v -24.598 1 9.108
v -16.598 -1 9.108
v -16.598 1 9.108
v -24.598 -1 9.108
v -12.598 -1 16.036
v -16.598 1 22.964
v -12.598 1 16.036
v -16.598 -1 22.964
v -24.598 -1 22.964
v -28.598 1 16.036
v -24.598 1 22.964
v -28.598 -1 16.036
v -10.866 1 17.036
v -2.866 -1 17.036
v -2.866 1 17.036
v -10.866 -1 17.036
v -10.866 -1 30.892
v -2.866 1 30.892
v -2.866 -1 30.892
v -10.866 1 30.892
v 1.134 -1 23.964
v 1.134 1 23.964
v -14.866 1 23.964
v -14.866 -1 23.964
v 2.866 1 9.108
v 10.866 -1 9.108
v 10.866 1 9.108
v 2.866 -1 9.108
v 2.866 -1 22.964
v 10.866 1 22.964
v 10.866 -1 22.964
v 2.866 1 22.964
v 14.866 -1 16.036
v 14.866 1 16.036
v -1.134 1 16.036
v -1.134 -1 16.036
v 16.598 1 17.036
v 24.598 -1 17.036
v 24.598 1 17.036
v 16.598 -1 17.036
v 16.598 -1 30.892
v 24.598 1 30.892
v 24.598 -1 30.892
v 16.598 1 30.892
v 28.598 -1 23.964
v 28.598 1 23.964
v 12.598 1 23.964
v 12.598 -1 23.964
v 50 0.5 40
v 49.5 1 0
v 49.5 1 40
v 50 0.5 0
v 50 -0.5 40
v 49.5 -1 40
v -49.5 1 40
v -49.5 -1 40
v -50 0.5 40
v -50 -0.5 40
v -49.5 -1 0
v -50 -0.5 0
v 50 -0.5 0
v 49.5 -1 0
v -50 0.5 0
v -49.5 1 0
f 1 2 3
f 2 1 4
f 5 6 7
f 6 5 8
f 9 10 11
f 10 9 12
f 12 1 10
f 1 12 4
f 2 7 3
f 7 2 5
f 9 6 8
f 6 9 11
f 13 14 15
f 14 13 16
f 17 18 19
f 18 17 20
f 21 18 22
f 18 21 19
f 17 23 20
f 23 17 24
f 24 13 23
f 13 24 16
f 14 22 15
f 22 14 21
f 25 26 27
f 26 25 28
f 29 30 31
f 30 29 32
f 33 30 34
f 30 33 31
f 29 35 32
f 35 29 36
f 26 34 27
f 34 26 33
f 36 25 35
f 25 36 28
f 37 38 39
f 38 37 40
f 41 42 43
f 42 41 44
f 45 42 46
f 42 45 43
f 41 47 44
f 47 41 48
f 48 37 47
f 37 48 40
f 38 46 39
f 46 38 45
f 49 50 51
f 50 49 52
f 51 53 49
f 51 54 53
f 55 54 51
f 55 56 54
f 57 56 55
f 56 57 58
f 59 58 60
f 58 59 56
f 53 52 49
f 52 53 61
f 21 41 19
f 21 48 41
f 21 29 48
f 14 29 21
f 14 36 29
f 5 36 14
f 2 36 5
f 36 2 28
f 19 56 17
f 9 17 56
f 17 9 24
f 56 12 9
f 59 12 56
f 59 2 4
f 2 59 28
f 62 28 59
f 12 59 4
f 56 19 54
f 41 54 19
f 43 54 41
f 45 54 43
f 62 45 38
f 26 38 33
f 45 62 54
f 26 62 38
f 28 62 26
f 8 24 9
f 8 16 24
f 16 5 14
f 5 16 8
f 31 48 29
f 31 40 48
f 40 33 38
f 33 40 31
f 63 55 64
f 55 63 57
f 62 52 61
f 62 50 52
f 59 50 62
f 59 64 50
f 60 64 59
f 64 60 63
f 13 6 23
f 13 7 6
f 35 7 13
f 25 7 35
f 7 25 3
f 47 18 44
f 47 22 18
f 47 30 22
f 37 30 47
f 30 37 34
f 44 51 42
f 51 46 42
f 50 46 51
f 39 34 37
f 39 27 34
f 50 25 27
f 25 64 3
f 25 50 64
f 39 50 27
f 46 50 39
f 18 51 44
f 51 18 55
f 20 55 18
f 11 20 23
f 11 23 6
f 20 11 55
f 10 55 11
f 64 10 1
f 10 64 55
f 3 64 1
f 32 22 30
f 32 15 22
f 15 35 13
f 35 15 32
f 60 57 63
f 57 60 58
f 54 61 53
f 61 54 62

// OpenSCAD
/* [Wand Dimensionen] */

// Länge der Trennwand (in mm)
wand_laenge = 100; // [20:1:400]

// Höhe der Trennwand (in mm)
wand_hoehe = 40; // [10:1:150]

// Dicke der Trennwand (in mm)
wand_dicke = 2.0; // [0.8:0.1:5.0]

/* [Optimierungen: Fasen & Material] */

// Fase an den kurzen Enden zum leichteren Einstecken (in mm, 0 = aus)
fase_enden = 0.5; // [0:0.1:2.0]

// Materialersparnis in der Mitte
ausschnitt_typ = "Waben"; // [Keine, Waben, Kreise]

// Größe der Waben/Kreise (Radius in mm)
ausschnitt_groesse = 8.0; // [2:1:30]

// NEU: Exakte Dicke der Stege zwischen den Ausschnitten (in mm)
steg_dicke = 2.0; // [0.5:0.1:10.0]

// Massiver Rand links und rechts für die Verbinder (in mm)
rand_seite = 20.0; // [5:1:50]

// Massiver Rand oben und unten für Stabilität (in mm)
rand_oben_unten = 5.0; // [2:1:20]

/* [Anordnung & Menge] */

// Anzahl der Wände auf dem Druckbett
anzahl_waende = 1; // [1:1:20]

// Abstand zwischen den einzelnen Wänden (in mm)
wand_abstand = 5; // [2:1:20]

/* [Hidden] */
$fn = 32;

// Erzeugt die 2D-Grundform der Wand mit optionalen Fasen
module wand_2d(l, d, c) {
    c_eff = min(c, d/2 - 0.01);
    if (c_eff > 0) {
        polygon([
            [-l/2 + c_eff, -d/2],
            [ l/2 - c_eff, -d/2],
            [ l/2,         -d/2 + c_eff],
            [ l/2,          d/2 - c_eff],
            [ l/2 - c_eff,  d/2],
            [-l/2 + c_eff,  d/2],
            [-l/2,          d/2 - c_eff],
            [-l/2,         -d/2 + c_eff]
        ]);
    } else {
        square([l, d], center=true);
    }
}

// Erzeugt das mathematisch exakte Gitter-Muster zum Abziehen
module cutouts(l, d, h) {
    if (ausschnitt_typ != "Keine") {
        
        // Exakte Berechnung des Abstands für konstante Stegdicke
        D = (ausschnitt_typ == "Waben") ? 
            (ausschnitt_groesse * sqrt(3) + steg_dicke) : 
            (ausschnitt_groesse * 2 + steg_dicke);
            
        spacing_x = D * sqrt(3)/2;
        spacing_z = D;
        
        // Berechne, wie viel Platz für das Muster real zur Verfügung steht
        max_w = l - 2*rand_seite - 2*ausschnitt_groesse;
        max_h = h - 2*rand_oben_unten - 2*ausschnitt_groesse;
        
        // Nur ausführen, wenn mindestens ein Ausschnitt passt
        if (max_w >= 0 && max_h >= 0) {
            cols = floor(max_w / spacing_x) + 1;
            rows = floor((max_h - (cols > 1 ? spacing_z/2 : 0)) / spacing_z) + 1;
            
            if (cols > 0 && rows > 0) {
                // Ermittelt die Gesamtgröße des Musters zur perfekten Zentrierung
                muster_breite = (cols - 1) * spacing_x;
                muster_hoehe = (rows - 1) * spacing_z + (cols > 1 ? spacing_z/2 : 0);
                
                start_x = -muster_breite / 2;
                start_z = (h - muster_hoehe) / 2;
                
                for (c = [0 : cols - 1]) {
                    for (r = [0 : rows - 1]) {
                        offset_z = (c % 2 == 0) ? 0 : spacing_z/2;
                        x_pos = start_x + c * spacing_x;
                        z_pos = start_z + r * spacing_z + offset_z;
                        
                        translate([x_pos, 0, z_pos])
                            rotate([90, 0, 0])
                                cylinder(r=ausschnitt_groesse, h=d+2, center=true, $fn=(ausschnitt_typ == "Waben" ? 6 : 32));
                    }
                }
            }
        }
    }
}

// Setzt die komplette Wand zusammen
module trennwand(l, d, h) {
    difference() {
        // 1. Grundkörper
        linear_extrude(height = h) {
            wand_2d(l, d, fase_enden);
        }
        
        // 2. Cutouts abziehen
        cutouts(l, d, h);
    }
}

// Schleife zur Vervielfältigung entlang der Y-Achse
for (i = [0 : anzahl_waende - 1]) {
    translate([0, i * (wand_dicke + wand_abstand), 0])
        trennwand(wand_laenge, wand_dicke, wand_hoehe);
}
